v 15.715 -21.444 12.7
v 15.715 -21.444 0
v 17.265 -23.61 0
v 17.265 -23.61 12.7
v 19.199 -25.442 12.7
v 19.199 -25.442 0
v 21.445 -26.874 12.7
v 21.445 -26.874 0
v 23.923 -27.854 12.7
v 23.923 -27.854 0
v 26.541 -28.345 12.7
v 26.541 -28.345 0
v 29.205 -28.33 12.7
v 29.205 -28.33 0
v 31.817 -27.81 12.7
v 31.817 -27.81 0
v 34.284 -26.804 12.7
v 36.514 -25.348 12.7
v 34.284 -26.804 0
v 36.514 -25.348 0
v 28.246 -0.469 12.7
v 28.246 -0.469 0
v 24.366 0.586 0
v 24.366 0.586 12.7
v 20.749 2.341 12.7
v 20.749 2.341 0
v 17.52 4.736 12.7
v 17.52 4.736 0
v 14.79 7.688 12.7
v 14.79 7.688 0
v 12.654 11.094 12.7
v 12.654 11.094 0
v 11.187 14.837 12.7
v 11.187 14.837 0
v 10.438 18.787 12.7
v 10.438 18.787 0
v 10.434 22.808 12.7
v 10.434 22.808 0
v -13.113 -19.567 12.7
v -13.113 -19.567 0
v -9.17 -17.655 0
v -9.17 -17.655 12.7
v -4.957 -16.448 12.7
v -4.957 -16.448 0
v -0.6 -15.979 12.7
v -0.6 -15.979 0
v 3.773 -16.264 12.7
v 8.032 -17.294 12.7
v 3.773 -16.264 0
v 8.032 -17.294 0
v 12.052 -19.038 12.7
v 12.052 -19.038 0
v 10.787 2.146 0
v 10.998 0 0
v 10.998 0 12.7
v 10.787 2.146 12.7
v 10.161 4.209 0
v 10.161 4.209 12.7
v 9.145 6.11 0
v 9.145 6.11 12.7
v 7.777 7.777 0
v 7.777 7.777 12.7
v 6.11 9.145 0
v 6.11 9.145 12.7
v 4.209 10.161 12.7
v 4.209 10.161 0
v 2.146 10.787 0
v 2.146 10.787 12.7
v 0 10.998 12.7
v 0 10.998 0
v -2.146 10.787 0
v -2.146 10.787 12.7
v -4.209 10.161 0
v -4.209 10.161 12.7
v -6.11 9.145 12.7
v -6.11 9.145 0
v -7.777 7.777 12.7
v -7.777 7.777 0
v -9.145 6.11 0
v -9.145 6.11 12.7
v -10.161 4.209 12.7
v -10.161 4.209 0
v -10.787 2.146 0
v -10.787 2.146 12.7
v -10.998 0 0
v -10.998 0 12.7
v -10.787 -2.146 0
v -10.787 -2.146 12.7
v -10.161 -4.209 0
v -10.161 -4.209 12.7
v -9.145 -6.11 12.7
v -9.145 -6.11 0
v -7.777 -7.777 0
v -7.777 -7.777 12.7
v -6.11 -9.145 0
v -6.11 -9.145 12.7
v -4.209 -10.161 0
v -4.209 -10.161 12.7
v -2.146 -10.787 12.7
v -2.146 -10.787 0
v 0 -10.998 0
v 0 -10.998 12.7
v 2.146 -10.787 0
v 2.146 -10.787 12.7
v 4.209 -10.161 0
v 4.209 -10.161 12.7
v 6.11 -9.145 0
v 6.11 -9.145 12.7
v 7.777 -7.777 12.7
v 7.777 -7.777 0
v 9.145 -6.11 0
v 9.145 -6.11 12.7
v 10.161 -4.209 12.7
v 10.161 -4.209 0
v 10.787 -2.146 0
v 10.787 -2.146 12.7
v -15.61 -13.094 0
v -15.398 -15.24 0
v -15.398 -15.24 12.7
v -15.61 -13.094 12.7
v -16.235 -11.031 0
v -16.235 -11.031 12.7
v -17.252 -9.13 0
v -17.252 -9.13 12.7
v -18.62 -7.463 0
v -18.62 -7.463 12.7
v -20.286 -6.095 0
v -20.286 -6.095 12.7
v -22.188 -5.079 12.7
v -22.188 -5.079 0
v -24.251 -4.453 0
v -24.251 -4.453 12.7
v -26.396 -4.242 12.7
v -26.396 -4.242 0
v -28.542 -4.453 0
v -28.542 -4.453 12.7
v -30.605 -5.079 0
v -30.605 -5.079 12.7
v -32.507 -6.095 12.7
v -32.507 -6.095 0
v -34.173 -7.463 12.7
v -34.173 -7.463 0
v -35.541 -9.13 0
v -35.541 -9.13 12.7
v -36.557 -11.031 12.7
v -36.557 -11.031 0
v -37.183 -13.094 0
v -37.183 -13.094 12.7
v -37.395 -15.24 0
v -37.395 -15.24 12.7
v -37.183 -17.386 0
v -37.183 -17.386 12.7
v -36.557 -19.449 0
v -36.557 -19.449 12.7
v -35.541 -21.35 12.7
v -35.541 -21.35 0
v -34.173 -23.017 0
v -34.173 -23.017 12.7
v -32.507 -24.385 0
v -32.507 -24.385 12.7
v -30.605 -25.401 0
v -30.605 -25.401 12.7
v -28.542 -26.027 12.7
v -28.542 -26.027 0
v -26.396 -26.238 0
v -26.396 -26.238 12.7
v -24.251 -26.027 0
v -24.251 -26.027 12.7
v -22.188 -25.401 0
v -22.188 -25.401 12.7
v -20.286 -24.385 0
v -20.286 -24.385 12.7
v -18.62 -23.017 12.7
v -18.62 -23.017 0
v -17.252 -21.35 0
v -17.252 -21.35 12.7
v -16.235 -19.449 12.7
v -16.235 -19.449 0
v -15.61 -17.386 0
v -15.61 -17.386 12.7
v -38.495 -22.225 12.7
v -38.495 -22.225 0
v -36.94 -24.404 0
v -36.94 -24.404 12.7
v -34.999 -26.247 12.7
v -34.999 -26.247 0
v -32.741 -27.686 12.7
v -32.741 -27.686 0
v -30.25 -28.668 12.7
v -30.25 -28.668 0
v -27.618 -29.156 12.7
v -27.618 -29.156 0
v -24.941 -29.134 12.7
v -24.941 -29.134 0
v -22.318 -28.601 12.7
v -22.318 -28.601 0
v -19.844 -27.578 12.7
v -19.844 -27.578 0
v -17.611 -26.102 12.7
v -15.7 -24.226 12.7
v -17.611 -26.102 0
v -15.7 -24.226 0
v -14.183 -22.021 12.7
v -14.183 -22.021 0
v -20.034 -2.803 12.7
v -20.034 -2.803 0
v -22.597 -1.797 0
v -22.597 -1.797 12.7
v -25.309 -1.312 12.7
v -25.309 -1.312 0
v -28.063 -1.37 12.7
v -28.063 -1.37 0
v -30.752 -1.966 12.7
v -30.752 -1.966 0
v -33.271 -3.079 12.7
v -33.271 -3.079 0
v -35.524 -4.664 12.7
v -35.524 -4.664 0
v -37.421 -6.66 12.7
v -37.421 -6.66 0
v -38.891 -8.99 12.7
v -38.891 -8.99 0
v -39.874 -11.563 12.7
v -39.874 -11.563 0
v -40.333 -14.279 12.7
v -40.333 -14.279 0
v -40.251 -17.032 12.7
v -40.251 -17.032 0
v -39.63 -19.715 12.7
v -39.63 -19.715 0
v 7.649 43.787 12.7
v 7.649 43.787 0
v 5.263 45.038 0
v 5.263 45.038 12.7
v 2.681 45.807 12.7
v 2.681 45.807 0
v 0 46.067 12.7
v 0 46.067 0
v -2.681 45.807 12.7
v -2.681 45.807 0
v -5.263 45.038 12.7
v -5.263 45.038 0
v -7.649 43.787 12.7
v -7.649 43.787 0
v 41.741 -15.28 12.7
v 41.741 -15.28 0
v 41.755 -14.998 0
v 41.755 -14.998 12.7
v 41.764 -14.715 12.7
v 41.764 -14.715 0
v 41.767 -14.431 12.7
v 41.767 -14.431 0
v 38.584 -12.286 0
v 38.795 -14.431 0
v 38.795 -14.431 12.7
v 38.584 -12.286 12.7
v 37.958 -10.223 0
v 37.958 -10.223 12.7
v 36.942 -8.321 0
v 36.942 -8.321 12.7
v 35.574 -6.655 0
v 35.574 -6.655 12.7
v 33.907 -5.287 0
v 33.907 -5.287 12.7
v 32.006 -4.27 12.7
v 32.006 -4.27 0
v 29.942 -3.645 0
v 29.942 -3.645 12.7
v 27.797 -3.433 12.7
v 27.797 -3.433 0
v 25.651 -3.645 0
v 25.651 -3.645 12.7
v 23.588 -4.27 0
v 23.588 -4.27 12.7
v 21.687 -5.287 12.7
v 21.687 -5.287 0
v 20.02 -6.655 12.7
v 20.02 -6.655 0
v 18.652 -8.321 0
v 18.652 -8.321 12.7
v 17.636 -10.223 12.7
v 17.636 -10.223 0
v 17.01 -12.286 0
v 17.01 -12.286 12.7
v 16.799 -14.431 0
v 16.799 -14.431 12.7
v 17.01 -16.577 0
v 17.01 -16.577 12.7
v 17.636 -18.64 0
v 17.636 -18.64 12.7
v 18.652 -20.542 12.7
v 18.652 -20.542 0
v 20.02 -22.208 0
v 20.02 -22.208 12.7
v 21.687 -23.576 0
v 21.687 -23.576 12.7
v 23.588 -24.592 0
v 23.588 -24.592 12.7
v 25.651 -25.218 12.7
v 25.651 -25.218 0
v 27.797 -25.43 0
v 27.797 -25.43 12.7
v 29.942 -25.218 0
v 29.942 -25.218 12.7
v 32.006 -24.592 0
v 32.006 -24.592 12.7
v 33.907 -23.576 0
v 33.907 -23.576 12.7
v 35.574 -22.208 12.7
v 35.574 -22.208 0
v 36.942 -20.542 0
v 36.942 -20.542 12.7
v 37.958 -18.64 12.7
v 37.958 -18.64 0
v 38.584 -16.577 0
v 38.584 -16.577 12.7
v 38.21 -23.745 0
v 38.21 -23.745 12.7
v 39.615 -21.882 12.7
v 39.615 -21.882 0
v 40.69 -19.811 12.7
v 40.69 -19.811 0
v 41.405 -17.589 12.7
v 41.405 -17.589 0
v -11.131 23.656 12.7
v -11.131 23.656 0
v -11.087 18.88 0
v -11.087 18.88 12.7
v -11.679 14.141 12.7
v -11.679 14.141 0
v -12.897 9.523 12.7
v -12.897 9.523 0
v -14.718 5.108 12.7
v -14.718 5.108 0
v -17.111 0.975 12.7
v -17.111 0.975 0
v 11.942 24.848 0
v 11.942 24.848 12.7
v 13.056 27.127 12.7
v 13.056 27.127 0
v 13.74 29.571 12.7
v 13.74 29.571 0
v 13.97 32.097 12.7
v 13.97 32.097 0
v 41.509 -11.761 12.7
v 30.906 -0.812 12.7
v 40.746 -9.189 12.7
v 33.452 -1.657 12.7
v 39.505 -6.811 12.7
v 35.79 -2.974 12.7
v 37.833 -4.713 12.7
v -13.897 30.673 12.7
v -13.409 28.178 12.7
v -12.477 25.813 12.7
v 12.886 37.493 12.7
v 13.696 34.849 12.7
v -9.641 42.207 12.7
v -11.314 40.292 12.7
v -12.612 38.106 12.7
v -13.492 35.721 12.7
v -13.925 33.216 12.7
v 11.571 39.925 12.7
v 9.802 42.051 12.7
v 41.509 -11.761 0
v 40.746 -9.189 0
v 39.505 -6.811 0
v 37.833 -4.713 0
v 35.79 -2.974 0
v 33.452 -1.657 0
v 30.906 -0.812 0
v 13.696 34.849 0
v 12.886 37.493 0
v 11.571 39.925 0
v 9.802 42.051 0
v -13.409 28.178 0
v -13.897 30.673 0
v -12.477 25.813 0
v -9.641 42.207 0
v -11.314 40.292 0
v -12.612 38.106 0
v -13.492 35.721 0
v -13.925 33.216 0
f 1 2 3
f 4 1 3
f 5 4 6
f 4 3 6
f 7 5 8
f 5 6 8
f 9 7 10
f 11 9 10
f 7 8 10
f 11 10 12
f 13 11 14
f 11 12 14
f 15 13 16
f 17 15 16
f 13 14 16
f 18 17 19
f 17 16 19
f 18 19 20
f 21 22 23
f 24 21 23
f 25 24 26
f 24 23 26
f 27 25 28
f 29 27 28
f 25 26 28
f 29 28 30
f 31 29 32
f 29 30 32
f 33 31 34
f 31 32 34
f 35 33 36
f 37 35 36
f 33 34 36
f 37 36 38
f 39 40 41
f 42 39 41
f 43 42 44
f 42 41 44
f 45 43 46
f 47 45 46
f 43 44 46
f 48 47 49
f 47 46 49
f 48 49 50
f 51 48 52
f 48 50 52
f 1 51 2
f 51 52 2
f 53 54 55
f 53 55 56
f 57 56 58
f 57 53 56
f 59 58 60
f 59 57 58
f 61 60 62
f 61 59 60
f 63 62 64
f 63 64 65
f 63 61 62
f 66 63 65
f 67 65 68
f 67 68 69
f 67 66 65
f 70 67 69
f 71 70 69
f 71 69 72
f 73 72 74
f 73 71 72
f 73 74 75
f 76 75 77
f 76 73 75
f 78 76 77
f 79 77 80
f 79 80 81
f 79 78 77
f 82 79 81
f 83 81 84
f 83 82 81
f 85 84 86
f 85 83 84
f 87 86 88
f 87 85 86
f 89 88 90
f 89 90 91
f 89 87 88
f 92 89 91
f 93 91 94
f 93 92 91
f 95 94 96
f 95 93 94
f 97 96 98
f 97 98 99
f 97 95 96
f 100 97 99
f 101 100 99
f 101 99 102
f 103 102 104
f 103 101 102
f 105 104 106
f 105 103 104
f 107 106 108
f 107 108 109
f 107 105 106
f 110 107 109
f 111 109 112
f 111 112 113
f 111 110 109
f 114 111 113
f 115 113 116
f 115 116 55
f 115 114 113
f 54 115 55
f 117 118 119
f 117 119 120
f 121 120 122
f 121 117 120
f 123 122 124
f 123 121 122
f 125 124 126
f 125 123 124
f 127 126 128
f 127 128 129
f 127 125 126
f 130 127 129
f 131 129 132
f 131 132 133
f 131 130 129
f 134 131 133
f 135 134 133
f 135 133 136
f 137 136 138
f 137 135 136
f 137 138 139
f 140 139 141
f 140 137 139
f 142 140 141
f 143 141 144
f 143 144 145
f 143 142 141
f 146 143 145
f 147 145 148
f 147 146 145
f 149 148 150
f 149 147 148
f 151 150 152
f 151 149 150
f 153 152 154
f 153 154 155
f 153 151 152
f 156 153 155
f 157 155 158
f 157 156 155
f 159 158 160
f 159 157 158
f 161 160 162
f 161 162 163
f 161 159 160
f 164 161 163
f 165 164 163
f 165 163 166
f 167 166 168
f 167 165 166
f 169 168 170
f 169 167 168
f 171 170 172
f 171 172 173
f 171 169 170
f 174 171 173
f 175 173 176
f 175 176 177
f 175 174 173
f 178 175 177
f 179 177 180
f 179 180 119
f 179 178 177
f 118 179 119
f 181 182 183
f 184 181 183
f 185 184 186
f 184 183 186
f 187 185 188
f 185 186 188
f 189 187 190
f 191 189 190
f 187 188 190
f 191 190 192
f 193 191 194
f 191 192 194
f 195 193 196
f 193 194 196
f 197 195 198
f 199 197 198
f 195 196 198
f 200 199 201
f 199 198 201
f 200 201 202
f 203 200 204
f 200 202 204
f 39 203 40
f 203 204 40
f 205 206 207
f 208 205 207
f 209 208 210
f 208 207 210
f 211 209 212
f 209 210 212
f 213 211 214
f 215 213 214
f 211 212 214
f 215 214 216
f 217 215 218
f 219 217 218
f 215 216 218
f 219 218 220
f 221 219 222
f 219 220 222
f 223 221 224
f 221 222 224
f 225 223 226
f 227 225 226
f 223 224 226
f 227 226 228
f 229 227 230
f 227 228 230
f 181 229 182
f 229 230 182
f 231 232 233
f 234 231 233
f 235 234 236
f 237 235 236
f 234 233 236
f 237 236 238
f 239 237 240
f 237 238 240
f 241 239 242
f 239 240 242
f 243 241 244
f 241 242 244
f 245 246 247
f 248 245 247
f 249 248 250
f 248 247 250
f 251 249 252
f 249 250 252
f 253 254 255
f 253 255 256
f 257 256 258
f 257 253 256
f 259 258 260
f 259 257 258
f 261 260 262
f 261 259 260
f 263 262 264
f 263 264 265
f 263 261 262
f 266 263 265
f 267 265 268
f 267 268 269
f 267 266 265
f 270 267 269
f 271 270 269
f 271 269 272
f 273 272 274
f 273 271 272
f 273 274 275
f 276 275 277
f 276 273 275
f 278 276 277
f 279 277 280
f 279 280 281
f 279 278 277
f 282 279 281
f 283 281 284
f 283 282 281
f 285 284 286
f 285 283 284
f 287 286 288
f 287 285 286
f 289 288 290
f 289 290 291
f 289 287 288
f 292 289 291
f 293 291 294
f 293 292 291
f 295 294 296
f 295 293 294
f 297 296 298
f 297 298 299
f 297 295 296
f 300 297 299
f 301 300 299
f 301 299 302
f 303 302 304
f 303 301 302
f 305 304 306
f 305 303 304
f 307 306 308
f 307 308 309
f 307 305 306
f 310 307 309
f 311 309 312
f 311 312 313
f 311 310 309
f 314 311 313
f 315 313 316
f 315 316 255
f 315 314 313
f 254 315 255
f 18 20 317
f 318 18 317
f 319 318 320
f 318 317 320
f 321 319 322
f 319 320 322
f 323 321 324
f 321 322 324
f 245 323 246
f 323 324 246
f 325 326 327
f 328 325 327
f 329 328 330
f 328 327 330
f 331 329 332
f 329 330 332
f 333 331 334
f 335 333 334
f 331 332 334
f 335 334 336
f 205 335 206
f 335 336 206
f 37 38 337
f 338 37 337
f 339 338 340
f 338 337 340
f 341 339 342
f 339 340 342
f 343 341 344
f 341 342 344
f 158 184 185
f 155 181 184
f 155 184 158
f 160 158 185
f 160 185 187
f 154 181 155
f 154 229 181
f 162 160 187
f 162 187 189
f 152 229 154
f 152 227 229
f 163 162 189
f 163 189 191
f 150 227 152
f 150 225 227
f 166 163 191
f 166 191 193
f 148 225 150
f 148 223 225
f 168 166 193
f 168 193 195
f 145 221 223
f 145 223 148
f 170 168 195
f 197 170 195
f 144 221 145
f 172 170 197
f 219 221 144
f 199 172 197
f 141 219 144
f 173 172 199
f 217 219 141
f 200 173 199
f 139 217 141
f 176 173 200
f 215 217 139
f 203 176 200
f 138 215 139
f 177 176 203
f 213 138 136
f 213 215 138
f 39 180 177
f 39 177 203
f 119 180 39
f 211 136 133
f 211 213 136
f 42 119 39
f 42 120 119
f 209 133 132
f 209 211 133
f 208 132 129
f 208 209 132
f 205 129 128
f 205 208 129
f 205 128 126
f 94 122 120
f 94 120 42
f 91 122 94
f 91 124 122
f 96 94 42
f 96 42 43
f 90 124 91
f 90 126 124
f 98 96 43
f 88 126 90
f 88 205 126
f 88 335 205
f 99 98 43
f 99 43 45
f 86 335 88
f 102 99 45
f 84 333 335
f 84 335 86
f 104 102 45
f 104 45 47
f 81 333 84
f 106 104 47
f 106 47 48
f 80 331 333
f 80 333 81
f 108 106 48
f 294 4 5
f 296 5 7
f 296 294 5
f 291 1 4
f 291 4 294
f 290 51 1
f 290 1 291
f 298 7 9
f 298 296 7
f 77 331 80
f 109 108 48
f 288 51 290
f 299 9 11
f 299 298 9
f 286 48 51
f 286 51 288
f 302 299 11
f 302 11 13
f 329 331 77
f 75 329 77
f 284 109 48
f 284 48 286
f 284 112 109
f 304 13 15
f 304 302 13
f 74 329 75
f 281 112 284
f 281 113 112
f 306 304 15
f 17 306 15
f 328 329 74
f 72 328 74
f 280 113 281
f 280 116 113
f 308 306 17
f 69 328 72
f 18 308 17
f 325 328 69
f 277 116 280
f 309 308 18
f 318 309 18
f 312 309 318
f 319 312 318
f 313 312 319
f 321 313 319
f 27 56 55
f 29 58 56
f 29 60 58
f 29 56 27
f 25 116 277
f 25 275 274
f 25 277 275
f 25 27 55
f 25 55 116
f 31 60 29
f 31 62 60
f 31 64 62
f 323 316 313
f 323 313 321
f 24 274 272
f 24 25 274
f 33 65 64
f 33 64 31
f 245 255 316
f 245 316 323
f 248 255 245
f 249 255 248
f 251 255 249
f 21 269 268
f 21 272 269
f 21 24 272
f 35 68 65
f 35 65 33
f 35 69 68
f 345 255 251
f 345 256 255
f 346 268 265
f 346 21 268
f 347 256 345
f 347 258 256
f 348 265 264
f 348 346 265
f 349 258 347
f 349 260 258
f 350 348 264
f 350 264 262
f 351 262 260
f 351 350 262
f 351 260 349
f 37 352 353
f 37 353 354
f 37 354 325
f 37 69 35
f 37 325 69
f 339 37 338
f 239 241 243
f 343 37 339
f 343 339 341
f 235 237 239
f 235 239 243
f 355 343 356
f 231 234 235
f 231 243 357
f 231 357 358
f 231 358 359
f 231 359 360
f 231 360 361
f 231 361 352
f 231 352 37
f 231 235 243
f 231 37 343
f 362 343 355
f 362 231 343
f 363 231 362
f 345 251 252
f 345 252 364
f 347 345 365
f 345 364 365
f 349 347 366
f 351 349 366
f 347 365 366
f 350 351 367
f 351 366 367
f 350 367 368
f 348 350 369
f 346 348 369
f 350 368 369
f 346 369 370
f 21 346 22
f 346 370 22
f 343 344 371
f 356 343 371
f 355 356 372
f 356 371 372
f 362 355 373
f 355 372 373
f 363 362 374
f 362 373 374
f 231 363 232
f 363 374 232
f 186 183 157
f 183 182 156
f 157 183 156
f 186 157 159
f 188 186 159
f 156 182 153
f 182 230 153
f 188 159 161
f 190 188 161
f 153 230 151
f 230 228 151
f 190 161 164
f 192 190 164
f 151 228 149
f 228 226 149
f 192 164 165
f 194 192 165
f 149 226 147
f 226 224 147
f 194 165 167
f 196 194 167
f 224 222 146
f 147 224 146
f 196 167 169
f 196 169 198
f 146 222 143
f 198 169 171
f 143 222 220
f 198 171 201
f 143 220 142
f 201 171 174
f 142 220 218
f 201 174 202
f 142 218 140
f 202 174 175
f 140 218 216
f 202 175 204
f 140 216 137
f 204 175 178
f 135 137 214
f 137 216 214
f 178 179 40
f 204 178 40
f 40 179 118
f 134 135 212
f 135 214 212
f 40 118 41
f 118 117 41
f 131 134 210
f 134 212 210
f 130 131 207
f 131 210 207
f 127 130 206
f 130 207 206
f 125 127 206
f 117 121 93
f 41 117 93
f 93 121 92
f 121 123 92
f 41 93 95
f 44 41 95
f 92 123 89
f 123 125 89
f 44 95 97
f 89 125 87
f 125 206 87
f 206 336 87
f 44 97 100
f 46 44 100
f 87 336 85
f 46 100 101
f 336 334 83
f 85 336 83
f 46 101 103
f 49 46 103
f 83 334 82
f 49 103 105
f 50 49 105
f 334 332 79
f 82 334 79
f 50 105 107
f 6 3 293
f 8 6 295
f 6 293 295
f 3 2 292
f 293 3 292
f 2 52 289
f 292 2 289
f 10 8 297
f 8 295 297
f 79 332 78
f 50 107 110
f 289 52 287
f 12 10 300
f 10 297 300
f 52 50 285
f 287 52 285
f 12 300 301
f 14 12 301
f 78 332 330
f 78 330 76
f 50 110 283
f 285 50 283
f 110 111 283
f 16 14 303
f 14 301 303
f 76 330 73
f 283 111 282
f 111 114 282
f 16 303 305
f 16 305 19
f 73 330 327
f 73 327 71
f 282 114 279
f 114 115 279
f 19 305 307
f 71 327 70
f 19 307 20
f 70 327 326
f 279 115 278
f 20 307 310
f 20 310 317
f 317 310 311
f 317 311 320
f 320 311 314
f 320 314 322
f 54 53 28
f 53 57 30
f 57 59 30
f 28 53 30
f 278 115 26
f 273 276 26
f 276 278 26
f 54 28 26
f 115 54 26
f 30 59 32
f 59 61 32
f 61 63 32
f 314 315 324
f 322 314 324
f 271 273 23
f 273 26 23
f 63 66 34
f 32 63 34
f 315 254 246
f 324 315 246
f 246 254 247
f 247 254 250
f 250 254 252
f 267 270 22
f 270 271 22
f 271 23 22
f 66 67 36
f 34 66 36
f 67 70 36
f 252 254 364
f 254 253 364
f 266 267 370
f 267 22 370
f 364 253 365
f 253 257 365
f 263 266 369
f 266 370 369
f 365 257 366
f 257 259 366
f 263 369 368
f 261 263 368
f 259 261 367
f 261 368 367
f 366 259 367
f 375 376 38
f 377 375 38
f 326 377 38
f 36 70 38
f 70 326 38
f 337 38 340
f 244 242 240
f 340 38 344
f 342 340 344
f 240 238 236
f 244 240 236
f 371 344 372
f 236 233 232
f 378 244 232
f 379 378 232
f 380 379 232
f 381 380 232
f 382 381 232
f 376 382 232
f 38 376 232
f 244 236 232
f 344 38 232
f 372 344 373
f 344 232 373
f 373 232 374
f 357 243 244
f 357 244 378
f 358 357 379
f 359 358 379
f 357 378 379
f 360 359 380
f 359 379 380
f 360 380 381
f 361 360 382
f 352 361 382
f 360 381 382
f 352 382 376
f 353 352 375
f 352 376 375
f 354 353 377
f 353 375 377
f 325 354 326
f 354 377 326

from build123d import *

# Parameters (mm, degrees)
F0_R     = 10.9982
F0_R_2   = 13.97
F1_DEPTH = 12.7


with BuildPart() as f1:
    # F0 (on Top) → F1 (new body)
    with BuildSketch(Plane.XY):
        with BuildLine():
            ThreePointArc((13.97, 32.0970378816), (12.2885629968, 38.7417440057), (7.6490093808, 43.7869290484))
            ThreePointArc((7.6490093808, 43.7869290484), (0, 44.45), (-7.6490093808, 43.7869290484))
            ThreePointArc((-7.6490093808, 43.7869290484), (-13.7655856932, 34.4781196782), (-11.1311920138, 23.6556242351))
            ThreePointArc((-11.1311920138, 23.6556242351), (-0.5487801971, 18.1378208443), (10.4341459432, 22.8078237902))
            ThreePointArc((10.4341459432, 22.8078237902), (13.0561464228, 27.1273356182), (13.97, 32.0970378816))
        make_face()
        with Locations((0, 32.0970378816)):
            Circle(F0_R, mode=Mode.SUBTRACT)
        with BuildLine():
            ThreePointArc((-7.6490093808, 43.7869290484), (0, 44.45), (7.6490093808, 43.7869290484))
            ThreePointArc((7.6490093808, 43.7869290484), (0, 46.0670378816), (-7.6490093808, 43.7869290484))
        make_face()
        with BuildLine():
            ThreePointArc((36.5141532997, -25.3479606439), (40.1954437919, -20.8685438007), (41.7410377882, -15.2803227832))
            ThreePointArc((41.7410377882, -15.2803227832), (39.4500705459, -20.4815632685), (36.5141532997, -25.3479606439))
        make_face()
        with BuildLine():
            ThreePointArc((36.5141532997, -25.3479606439), (39.4500705459, -20.4815632685), (41.7410377882, -15.2803227832))
            ThreePointArc((41.7410377882, -15.2803227832), (41.7603955997, -14.856098108), (41.7668501917, -14.4314810592))
            ThreePointArc((41.7668501917, -14.4314810592), (37.8325982415, -4.7132167552), (28.245782034, -0.4686962295))
            ThreePointArc((28.245782034, -0.4686962295), (15.8040282066, -7.2667674687), (15.7145912135, -21.4443205685))
            ThreePointArc((15.7145912135, -21.4443205685), (25.2199657431, -28.1617602457), (36.5141532997, -25.3479606439))
        make_face()
        with Locations((27.7968501917, -14.4314810592)):
            Circle(F0_R, mode=Mode.SUBTRACT)
        with BuildLine():
            ThreePointArc((-20.0335070466, -2.8032077223), (-36.5219312191, -5.6152601432), (-38.4948294602, -22.2249995463))
            ThreePointArc((-38.4948294602, -22.2249995463), (-24.9413525406, -29.134012338), (-13.1134053752, -19.5668361497))
            ThreePointArc((-13.1134053752, -19.5668361497), (-12.5992608684, -17.4305143709), (-12.4264543073, -15.24))
            ThreePointArc((-12.4264543073, -15.24), (-14.4790033796, -7.9506061031), (-20.0335070466, -2.8032077223))
        make_face()
        with Locations((-26.3964543073, -15.24)):
            Circle(F0_R, mode=Mode.SUBTRACT)
        with BuildLine():
            ThreePointArc((10.4341459432, 22.8078237902), (-0.5487801971, 18.1378208443), (-11.1311920138, 23.6556242351))
            ThreePointArc((-11.1311920138, 23.6556242351), (-12.8966882758, 9.5225930629), (-20.0335070466, -2.8032077223))
            ThreePointArc((-20.0335070466, -2.8032077223), (-14.4790033796, -7.9506061031), (-12.4264543073, -15.24))
            ThreePointArc((-12.4264543073, -15.24), (-12.5992608684, -17.4305143709), (-13.1134053752, -19.5668361497))
            ThreePointArc((-13.1134053752, -19.5668361497), (1.5922377479, -16.0274926586), (15.7145912135, -21.4443205685))
            ThreePointArc((15.7145912135, -21.4443205685), (15.8040282066, -7.2667674687), (28.245782034, -0.4686962295))
            ThreePointArc((28.245782034, -0.4686962295), (14.7899139444, 7.6877788952), (10.4341459432, 22.8078237902))
        make_face()
        Circle(F0_R_2, mode=Mode.SUBTRACT)
        with Locations((0, 32.0970378816)):
            Circle(F0_R)
        Circle(F0_R_2)
        Circle(F0_R, mode=Mode.SUBTRACT)
    extrude(amount=F1_DEPTH)


solid = f1.part
